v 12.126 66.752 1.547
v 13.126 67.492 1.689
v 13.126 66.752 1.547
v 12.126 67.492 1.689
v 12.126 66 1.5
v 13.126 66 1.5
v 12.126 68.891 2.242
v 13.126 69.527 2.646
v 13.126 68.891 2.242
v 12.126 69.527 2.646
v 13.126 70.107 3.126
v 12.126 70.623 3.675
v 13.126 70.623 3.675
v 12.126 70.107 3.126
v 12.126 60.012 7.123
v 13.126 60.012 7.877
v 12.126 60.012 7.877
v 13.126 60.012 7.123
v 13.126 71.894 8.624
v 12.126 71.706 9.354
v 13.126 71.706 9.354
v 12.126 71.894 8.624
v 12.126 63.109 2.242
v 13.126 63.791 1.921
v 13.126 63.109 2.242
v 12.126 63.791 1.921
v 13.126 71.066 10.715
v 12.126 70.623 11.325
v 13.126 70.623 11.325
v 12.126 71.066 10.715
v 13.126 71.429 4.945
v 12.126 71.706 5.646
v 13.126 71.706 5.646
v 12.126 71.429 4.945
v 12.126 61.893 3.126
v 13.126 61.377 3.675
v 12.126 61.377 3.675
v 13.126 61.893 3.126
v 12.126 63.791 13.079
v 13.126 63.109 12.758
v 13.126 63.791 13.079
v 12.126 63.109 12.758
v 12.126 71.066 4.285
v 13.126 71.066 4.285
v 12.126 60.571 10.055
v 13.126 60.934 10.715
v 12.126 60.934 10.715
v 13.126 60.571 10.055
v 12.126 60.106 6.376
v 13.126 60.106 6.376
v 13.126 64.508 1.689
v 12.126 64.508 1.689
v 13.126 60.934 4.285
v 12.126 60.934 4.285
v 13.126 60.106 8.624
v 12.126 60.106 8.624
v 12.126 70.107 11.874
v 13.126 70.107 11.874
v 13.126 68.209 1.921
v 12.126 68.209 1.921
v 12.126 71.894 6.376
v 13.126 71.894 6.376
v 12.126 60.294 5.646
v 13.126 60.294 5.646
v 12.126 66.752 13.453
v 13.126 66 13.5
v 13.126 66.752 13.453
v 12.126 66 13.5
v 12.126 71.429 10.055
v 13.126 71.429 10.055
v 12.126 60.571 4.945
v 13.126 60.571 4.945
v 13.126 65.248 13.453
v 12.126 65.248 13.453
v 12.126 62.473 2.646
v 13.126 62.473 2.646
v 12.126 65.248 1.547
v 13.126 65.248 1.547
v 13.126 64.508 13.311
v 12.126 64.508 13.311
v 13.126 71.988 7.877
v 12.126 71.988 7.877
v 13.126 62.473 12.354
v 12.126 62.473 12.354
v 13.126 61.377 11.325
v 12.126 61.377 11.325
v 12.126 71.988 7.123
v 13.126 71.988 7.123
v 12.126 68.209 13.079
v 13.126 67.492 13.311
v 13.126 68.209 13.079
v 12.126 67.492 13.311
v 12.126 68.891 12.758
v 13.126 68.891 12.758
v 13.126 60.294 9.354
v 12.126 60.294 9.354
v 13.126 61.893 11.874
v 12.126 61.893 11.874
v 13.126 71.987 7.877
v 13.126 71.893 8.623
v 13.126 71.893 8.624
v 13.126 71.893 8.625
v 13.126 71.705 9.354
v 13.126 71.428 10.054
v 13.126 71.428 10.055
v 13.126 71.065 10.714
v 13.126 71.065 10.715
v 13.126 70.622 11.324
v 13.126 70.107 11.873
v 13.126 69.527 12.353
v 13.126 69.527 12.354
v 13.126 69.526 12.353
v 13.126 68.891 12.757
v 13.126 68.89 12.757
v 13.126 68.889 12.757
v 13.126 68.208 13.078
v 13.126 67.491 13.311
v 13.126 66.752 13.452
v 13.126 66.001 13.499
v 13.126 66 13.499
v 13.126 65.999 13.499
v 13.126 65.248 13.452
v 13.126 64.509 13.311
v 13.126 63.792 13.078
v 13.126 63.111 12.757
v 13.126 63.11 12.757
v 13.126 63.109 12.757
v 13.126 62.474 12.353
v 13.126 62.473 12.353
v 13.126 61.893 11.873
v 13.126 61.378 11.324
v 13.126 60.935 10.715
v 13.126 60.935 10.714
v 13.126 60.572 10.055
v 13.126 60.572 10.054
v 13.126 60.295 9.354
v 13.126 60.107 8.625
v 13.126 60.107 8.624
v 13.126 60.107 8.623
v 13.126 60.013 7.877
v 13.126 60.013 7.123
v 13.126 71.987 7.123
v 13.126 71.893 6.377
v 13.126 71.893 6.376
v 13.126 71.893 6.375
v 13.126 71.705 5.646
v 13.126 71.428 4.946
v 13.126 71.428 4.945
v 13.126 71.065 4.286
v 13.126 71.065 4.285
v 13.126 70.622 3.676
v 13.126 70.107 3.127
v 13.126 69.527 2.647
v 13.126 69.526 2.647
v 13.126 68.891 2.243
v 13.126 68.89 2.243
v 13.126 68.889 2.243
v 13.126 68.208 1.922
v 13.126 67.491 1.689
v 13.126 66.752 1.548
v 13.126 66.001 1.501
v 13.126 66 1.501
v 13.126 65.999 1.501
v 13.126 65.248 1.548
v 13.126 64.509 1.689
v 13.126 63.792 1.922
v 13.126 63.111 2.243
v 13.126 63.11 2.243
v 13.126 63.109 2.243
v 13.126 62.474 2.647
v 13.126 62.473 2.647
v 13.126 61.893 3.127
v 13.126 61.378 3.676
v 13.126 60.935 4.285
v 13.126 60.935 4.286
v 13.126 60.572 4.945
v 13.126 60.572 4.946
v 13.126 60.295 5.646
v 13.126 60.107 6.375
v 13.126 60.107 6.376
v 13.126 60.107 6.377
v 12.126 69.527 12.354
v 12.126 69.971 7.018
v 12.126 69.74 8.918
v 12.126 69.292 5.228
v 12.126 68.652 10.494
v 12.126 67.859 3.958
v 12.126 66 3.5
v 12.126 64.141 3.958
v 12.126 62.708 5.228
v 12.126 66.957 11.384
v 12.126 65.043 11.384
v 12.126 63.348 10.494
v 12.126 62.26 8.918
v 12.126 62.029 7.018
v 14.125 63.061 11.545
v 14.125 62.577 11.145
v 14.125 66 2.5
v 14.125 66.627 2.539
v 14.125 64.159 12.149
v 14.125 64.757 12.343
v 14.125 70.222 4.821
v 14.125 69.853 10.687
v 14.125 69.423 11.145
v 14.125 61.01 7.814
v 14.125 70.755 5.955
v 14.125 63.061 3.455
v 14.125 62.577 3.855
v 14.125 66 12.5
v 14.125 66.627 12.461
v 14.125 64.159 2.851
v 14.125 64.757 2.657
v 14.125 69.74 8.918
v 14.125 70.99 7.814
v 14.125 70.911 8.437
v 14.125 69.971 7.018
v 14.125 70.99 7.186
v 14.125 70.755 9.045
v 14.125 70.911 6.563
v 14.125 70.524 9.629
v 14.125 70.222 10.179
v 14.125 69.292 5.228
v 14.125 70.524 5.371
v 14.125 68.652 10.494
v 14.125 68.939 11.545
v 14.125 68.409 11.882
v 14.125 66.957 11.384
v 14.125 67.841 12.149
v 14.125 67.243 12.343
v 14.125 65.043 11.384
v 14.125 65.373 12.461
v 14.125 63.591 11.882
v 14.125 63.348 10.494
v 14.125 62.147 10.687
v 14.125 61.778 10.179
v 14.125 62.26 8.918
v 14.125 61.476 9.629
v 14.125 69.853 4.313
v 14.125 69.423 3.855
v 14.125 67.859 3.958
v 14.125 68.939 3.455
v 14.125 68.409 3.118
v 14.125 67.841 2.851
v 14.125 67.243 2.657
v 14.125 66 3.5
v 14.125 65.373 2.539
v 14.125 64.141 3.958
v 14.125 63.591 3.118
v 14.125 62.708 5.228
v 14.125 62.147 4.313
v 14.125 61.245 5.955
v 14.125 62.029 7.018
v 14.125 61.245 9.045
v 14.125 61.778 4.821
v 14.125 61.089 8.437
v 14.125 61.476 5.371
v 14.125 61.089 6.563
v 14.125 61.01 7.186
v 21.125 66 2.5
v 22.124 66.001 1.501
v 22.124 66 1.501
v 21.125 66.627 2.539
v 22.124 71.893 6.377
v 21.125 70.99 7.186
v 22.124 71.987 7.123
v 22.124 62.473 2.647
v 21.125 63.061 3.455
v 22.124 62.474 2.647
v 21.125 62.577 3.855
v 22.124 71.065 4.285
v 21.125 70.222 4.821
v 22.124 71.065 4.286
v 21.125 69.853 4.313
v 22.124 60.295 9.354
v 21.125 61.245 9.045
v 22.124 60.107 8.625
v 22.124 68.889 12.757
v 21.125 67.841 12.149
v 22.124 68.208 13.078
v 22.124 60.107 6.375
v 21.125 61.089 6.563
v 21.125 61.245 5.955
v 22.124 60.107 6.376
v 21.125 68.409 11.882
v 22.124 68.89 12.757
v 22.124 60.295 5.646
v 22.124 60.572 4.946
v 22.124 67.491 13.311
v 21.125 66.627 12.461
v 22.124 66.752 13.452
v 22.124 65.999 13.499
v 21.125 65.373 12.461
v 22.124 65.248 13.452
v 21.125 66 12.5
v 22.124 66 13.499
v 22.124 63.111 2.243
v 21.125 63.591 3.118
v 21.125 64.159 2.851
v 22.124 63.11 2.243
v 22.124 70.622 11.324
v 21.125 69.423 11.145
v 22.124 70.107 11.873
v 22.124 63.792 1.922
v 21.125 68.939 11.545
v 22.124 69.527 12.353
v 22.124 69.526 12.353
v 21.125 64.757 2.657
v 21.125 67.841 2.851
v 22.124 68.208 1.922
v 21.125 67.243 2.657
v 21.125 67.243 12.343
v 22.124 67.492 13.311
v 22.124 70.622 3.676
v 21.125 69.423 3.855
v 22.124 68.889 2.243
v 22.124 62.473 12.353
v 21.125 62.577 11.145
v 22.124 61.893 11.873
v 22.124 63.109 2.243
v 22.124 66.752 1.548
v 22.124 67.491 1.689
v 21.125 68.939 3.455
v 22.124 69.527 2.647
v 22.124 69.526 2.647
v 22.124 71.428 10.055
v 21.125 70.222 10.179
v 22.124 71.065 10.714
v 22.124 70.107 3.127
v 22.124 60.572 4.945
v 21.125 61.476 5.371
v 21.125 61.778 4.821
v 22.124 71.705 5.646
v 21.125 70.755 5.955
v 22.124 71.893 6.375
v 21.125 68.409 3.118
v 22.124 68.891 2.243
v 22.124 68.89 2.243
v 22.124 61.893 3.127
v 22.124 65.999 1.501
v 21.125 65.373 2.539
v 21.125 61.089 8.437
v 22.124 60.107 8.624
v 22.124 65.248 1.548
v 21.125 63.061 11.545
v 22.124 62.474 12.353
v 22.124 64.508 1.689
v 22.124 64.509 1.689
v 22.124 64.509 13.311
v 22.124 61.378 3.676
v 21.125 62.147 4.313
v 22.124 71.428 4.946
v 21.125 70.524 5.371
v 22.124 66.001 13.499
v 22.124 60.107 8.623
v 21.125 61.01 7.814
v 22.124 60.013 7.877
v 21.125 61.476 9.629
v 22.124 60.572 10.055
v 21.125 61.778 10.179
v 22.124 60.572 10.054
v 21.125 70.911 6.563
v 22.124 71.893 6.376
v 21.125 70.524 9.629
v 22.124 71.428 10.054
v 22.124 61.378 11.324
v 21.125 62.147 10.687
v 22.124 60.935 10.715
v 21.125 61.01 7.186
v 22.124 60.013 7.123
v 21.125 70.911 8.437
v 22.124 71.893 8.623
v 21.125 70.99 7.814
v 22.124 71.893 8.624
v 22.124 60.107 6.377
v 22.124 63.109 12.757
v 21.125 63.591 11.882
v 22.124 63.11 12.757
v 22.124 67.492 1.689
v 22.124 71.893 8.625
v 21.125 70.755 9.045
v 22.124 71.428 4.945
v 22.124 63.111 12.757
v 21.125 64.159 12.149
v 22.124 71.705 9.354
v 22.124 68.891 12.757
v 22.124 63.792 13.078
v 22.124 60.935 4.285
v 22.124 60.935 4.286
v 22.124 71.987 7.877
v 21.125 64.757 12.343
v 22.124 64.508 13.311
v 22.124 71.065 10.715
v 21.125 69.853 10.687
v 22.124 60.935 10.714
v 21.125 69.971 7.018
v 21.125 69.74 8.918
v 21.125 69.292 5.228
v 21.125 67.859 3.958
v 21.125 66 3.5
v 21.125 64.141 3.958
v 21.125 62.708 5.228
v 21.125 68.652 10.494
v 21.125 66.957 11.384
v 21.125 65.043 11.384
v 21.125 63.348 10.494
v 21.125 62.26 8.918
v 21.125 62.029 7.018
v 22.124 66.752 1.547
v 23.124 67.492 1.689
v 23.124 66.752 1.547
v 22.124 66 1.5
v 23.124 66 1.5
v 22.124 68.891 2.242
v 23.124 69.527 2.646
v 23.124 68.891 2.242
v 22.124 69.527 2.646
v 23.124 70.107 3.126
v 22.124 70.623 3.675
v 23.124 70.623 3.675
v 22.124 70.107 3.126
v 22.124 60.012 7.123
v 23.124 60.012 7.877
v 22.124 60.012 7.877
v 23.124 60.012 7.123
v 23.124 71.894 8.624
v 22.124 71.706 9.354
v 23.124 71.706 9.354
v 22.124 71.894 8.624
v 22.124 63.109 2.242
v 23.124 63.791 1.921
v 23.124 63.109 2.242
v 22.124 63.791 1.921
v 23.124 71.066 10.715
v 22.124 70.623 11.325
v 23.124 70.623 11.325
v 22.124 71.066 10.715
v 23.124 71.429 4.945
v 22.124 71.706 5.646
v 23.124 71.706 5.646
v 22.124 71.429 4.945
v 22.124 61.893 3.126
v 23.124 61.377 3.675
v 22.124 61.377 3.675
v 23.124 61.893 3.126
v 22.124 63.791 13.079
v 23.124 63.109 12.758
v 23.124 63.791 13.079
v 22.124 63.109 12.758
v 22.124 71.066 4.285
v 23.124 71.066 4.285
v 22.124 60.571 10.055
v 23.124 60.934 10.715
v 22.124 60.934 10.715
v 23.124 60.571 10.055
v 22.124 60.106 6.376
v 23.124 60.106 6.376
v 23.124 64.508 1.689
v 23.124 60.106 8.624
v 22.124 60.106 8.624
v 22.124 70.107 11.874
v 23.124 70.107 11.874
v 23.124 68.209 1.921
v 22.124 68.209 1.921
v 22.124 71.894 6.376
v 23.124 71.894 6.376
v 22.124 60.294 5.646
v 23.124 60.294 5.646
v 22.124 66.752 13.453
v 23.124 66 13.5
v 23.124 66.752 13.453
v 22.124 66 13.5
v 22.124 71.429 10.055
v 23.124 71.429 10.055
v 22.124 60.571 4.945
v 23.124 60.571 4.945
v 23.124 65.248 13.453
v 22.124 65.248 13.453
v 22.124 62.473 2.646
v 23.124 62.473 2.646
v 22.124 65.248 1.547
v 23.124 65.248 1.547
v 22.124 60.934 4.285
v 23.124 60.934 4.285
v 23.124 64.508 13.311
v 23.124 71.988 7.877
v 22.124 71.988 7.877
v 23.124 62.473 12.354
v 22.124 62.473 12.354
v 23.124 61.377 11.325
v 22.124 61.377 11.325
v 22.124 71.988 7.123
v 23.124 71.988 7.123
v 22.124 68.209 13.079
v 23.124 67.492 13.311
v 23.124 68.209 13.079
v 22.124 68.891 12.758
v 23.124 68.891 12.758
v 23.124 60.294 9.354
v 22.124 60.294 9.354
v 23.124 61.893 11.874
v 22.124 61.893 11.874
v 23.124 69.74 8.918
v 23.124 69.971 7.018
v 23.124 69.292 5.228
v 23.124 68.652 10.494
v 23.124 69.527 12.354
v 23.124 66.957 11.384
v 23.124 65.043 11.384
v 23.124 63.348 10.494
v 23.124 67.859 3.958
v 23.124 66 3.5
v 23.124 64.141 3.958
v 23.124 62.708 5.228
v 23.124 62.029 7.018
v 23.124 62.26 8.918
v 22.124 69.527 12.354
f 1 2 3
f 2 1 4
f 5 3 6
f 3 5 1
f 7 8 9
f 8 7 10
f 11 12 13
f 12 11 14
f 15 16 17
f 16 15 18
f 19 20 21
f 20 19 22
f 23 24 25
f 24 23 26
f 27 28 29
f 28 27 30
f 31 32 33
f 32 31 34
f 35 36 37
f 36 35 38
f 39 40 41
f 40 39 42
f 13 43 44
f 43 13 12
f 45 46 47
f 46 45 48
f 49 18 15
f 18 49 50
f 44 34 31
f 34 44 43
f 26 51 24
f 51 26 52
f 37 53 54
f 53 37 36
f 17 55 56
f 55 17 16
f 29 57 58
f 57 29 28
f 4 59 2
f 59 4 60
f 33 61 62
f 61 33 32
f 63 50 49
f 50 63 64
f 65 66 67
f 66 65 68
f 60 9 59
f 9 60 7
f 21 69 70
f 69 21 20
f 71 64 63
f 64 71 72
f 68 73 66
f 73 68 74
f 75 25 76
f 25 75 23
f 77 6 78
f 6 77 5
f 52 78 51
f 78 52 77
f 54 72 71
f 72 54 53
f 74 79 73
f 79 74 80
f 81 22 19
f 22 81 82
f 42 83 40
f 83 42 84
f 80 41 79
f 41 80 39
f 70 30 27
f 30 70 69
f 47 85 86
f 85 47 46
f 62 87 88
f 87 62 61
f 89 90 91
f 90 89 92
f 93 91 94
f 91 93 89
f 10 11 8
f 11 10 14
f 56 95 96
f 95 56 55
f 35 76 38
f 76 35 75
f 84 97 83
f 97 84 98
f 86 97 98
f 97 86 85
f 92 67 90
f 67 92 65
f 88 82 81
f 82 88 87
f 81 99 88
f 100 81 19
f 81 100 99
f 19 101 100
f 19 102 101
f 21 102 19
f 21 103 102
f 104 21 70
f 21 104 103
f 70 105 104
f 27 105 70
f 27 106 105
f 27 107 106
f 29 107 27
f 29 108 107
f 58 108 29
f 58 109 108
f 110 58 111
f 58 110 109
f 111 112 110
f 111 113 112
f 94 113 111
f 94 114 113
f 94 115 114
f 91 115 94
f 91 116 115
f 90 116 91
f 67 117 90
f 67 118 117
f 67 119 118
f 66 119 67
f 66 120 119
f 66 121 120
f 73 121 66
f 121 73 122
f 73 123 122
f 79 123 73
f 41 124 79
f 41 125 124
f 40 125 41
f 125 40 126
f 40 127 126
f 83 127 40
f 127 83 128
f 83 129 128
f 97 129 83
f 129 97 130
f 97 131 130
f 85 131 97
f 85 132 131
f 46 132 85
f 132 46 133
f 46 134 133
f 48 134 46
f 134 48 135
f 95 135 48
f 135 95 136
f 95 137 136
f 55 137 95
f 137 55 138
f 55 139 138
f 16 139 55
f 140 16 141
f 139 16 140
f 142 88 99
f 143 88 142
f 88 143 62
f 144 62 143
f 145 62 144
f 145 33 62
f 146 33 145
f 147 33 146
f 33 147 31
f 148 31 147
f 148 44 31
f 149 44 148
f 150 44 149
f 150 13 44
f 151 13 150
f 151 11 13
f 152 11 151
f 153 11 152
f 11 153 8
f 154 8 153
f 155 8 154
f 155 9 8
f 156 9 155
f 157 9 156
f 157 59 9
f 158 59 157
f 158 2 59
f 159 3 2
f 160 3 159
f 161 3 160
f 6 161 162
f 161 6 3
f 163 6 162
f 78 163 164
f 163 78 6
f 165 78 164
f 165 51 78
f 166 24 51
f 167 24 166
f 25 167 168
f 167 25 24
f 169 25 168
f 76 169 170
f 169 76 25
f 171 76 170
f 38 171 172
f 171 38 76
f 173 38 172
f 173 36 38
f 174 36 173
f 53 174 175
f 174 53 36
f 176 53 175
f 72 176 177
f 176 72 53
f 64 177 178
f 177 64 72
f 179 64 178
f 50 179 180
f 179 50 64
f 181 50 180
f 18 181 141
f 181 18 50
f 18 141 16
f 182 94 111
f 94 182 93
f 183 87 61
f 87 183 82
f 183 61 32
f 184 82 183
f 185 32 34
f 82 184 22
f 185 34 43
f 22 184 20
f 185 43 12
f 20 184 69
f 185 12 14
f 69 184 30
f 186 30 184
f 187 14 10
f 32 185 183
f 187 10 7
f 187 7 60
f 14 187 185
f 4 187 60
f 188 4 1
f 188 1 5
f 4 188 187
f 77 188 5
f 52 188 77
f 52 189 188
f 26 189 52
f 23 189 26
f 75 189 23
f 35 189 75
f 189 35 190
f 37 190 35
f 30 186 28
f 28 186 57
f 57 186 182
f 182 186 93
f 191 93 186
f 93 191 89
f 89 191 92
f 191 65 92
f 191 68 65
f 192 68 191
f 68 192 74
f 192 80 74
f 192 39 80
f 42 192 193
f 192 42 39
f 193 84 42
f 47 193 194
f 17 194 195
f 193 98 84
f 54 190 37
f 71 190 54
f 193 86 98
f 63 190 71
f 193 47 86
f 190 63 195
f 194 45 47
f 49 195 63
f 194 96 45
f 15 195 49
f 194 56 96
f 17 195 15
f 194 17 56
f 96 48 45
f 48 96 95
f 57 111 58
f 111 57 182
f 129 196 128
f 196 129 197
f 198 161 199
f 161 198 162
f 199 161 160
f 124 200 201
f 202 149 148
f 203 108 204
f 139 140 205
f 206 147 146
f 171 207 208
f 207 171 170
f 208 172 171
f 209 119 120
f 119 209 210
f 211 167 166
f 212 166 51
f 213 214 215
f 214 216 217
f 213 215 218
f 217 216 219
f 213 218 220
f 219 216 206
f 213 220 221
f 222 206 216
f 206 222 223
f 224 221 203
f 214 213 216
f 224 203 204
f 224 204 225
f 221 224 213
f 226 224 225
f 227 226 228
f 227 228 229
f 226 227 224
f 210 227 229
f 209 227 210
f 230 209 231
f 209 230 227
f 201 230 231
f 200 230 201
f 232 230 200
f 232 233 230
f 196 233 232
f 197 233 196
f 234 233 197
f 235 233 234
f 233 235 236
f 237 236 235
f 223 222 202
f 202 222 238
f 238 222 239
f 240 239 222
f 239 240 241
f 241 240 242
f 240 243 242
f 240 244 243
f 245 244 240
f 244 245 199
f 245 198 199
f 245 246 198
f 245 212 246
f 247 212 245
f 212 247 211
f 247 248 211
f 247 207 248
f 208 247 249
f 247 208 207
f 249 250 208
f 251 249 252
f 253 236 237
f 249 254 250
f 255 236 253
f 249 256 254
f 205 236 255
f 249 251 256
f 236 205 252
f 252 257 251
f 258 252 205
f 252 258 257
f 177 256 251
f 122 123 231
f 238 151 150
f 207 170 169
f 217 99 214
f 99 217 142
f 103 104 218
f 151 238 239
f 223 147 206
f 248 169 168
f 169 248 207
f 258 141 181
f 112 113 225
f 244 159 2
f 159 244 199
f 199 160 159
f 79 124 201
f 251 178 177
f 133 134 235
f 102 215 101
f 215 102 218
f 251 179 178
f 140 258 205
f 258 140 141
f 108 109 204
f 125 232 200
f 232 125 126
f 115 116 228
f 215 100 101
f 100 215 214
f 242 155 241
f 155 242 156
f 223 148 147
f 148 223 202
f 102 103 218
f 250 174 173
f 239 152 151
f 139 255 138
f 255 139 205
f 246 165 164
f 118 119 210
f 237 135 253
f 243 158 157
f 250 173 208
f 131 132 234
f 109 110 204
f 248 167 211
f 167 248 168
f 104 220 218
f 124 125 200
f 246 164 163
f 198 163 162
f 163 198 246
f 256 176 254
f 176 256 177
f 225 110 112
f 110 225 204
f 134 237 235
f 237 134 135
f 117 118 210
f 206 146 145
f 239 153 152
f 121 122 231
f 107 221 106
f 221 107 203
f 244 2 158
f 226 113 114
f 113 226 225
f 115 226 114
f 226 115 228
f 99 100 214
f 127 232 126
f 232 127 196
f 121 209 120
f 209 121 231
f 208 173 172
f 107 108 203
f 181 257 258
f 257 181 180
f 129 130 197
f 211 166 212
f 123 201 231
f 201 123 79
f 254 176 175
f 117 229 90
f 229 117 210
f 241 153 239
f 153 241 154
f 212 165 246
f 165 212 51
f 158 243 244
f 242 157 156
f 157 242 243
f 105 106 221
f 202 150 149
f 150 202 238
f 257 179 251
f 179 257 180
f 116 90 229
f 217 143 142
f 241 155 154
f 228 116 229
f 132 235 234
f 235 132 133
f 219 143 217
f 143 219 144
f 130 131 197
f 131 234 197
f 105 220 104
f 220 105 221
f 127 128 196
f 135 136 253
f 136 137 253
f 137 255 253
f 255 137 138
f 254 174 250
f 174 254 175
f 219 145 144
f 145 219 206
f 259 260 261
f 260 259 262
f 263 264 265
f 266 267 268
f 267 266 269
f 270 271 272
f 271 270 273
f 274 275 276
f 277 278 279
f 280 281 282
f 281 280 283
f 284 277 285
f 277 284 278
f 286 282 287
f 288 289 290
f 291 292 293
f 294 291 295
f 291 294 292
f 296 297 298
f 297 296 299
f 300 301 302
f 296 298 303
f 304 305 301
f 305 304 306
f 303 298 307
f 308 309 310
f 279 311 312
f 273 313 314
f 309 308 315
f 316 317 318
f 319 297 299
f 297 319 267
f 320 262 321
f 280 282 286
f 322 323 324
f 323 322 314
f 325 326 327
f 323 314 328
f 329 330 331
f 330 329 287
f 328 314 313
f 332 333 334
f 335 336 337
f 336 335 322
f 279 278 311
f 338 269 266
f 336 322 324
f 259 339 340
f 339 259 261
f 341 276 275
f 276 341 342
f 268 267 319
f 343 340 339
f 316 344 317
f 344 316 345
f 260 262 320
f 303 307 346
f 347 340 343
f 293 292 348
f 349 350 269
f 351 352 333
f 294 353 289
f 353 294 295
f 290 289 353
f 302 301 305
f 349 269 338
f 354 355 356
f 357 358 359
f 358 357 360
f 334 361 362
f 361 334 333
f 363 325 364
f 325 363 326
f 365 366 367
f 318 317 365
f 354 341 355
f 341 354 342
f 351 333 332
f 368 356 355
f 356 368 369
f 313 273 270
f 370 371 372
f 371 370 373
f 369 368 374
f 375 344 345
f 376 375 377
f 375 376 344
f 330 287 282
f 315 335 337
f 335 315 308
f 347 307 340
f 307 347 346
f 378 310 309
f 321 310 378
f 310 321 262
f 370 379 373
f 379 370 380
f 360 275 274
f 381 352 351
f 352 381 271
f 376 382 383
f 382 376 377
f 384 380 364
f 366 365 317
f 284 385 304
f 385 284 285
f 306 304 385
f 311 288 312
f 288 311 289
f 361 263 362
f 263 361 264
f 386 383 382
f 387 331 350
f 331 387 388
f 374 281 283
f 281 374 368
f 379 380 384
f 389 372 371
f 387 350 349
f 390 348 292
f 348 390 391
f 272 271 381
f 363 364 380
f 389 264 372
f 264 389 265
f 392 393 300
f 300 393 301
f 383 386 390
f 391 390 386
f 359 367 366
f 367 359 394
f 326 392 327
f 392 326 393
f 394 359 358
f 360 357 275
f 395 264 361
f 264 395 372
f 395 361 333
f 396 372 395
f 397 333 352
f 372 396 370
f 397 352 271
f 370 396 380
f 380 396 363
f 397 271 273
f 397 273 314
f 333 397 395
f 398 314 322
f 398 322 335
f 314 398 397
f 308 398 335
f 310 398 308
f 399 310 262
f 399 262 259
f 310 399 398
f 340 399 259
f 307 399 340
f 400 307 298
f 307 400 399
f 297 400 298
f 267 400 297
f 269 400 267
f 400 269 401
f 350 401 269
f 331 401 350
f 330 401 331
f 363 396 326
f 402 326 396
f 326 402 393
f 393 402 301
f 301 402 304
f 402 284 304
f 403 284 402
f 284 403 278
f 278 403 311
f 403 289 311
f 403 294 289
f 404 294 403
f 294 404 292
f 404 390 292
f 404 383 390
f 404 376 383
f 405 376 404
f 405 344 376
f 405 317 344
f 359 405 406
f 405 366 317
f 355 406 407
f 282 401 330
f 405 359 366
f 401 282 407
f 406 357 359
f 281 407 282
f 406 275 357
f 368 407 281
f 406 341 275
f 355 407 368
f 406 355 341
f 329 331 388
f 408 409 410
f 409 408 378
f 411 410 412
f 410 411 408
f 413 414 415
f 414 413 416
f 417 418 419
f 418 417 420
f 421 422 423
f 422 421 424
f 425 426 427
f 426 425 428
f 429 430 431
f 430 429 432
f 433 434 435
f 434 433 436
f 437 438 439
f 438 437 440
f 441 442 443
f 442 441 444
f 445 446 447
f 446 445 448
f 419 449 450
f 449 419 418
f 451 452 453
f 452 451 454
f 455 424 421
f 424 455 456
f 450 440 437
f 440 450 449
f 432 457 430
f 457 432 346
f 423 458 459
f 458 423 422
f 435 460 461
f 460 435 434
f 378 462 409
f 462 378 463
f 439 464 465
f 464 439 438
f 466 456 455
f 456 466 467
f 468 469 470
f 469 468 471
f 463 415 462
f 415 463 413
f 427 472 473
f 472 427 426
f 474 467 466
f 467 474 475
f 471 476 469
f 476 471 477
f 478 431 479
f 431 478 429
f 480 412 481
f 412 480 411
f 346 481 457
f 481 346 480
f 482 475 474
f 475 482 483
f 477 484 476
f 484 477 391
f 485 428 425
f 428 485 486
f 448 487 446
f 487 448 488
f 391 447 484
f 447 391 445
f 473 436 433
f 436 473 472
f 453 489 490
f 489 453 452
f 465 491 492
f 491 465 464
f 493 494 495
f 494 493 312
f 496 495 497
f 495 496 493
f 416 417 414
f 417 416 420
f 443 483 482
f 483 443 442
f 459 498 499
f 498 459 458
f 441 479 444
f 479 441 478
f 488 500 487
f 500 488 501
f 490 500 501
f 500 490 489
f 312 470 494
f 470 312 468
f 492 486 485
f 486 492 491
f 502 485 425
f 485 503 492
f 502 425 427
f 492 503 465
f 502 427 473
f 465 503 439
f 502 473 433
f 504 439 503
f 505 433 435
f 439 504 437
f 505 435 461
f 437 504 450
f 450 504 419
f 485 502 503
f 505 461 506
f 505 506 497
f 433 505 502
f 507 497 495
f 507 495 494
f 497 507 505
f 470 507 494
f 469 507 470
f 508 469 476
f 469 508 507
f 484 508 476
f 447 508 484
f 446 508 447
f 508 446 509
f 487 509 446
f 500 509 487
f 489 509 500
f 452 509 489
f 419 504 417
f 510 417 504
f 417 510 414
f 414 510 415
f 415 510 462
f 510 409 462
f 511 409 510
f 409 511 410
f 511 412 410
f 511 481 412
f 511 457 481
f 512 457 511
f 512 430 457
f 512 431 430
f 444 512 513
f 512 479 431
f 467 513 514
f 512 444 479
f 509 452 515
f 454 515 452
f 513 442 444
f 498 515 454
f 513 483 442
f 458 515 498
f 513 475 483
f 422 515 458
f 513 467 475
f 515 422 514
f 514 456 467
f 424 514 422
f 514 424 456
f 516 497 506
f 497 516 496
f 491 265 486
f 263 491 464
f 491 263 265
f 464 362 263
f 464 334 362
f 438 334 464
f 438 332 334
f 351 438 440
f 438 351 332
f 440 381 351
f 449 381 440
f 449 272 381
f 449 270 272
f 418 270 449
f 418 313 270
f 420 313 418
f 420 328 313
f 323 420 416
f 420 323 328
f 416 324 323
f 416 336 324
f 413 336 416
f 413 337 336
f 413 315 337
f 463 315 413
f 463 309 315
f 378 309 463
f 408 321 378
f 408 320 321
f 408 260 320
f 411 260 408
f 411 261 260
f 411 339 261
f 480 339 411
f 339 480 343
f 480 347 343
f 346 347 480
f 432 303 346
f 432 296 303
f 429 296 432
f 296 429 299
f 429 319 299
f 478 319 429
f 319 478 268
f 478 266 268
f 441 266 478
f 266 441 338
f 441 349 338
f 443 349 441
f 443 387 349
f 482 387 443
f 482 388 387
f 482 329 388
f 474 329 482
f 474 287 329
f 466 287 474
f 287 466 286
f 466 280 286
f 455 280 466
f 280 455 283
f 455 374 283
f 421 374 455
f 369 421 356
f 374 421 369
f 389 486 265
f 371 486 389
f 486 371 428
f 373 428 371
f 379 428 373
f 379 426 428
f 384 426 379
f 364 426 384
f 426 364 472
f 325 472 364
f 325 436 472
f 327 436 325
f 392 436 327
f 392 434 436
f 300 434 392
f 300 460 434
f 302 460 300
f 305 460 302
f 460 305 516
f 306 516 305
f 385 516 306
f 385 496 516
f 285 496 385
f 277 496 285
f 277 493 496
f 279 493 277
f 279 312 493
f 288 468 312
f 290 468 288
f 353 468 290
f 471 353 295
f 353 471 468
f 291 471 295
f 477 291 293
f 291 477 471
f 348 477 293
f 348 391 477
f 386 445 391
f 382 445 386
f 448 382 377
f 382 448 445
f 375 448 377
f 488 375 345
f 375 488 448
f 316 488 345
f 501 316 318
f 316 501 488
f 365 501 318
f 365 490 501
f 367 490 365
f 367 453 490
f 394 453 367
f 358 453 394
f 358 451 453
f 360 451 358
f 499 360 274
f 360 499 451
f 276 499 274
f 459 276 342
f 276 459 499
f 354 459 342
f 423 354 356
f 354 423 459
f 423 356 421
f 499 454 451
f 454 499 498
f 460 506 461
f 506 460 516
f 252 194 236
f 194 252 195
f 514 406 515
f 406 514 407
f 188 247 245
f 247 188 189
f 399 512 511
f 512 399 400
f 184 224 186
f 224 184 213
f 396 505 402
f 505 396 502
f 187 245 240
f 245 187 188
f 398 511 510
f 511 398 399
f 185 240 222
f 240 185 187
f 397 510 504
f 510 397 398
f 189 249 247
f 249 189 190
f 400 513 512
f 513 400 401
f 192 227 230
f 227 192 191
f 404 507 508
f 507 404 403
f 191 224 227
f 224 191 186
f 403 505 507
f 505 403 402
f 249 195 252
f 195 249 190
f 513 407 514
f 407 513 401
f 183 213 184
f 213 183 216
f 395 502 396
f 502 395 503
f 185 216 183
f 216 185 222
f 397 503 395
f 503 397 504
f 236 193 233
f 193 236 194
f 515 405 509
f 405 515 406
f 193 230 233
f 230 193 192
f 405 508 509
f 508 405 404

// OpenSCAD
/*
* ReprapJeanne V2 
*
* Fixation des poulies
* le long des axes
* 
*
* Copyleft (see license file):
* hackerspace Jeanned'Hack http://www.jeannedhack.org
* Timothee
*
*/

fixationPoulies();
module fixationPoulies(){
  difference(){
  	union(){
		linear_extrude(height=15)
  		import (file="profil-axe.dxf", layer="poulies", $fn=100);
		translate([13.125, 66, 7.5]) rotate([0,90,0])bumpForBearing7();
	}
	union(){
  		translate([0, 66, 7.5])rotate([0, 90, 0]) cylinder(h=35, r=4);
  		translate([-8, 35, 7.5]) rotate([90, 0, 0]) cylinder(r=1.5, h=35);
  		translate([43.25, 35, 7.5]) rotate([90, 0, 0]) cylinder(r=1.5, h=35);
	}
  }
}

module bumpForBearing7(){
	translate([0,0,-0.999])cylinder (r=6, h=1,$fn=50); 
	 cylinder (r1=6, r2=5, h=1, $fn=50);
 	 translate([0,0,8])cylinder (r1=5, r2=6, h=1, $fn=50);
	translate([0,0,8.999]) cylinder (r=6, h=1,$fn=50); 

}
